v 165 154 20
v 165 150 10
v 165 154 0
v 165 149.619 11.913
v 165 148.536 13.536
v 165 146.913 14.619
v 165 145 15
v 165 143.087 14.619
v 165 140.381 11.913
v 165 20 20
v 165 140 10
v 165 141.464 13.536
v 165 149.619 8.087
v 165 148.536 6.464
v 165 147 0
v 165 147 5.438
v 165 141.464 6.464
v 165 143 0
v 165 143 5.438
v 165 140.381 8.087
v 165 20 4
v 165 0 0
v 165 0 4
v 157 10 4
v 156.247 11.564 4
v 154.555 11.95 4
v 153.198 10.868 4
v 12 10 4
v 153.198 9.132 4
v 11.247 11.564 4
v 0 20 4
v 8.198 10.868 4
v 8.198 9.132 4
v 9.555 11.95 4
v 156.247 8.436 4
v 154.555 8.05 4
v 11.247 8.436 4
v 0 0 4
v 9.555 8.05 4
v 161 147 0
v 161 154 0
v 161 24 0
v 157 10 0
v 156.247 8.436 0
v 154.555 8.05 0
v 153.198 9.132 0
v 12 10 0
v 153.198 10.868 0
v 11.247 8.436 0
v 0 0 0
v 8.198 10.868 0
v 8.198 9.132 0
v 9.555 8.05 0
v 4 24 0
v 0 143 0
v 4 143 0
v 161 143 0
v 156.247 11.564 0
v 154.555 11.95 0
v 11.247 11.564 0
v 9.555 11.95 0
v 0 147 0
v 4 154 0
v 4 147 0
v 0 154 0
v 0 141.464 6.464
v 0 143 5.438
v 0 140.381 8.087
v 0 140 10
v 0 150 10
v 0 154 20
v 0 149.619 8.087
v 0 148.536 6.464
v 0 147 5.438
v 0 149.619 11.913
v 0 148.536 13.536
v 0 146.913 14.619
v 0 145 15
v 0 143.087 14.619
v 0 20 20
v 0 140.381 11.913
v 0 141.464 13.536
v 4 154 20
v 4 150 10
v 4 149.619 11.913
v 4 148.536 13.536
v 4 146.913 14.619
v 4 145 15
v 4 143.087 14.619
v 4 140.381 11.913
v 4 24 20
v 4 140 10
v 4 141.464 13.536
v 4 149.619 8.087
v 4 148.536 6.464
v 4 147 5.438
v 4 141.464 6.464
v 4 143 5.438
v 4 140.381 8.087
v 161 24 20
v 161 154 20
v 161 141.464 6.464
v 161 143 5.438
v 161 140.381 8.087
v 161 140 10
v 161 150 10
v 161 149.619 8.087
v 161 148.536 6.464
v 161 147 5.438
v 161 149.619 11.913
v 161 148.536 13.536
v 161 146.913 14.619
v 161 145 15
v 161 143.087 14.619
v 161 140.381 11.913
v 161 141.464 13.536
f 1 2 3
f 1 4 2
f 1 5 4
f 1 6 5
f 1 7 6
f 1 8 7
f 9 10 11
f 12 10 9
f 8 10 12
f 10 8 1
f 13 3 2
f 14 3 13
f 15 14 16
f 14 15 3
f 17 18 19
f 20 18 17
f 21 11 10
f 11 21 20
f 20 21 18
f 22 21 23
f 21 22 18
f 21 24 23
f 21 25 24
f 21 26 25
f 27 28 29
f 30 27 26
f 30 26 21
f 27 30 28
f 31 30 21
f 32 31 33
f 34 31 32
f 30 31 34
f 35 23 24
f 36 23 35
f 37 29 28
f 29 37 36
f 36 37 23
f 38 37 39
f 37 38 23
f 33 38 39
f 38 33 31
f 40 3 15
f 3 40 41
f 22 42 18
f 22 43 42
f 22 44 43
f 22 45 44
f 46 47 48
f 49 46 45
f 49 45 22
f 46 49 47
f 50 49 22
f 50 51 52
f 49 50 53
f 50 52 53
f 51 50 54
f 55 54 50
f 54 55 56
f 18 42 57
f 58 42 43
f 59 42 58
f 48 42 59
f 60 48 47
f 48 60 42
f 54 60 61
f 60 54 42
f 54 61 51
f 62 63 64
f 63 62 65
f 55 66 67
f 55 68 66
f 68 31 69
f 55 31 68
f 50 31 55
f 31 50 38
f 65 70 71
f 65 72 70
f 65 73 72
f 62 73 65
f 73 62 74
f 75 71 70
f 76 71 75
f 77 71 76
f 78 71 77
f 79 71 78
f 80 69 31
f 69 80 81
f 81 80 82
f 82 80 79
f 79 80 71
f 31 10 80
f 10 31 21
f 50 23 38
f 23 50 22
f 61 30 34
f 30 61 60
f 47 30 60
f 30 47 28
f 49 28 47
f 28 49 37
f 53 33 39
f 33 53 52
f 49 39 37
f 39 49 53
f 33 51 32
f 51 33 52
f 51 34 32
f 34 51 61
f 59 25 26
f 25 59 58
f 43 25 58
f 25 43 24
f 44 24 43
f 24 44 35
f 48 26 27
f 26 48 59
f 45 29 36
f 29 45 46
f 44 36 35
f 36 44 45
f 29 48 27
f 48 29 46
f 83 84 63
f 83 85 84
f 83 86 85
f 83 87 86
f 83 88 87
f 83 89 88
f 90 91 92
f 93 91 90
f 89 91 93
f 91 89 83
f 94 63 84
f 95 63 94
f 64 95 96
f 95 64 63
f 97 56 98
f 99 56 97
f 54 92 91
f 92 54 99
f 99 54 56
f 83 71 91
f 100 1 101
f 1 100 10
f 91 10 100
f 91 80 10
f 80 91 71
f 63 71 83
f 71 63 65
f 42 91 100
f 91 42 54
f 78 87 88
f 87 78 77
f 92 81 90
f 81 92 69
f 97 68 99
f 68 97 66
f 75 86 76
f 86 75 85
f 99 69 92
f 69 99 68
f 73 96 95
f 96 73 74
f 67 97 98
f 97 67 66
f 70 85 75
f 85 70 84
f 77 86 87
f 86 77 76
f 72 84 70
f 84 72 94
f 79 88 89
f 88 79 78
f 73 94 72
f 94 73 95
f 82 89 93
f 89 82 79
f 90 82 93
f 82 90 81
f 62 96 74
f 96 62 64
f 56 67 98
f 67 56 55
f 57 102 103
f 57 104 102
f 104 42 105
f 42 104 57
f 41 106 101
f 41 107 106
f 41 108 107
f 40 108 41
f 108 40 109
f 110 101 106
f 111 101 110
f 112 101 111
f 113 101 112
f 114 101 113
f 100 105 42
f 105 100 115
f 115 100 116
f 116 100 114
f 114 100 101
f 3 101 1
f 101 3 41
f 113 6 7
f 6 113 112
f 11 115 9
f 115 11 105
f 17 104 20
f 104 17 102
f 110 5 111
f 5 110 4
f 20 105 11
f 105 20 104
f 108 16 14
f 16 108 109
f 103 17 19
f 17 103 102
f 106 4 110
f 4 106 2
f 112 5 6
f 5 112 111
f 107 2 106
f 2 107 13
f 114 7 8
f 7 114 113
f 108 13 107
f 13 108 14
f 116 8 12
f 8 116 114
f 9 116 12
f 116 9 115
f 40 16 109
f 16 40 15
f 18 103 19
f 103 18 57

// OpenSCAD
length = 165;
height = 20;
thickness = 4;
fixture_height = 20;
top_height = 130;

difference() {
    cube([length, fixture_height, thickness]);
    translate([10, 10, 0]) cylinder(thickness, r=2);
    translate([155, 10, 0]) cylinder(thickness, r=2);
}

translate([0, fixture_height, 0]) cube([165, thickness, height]);

// top
difference() {
    translate([0, fixture_height + thickness, 0]) cube([thickness, top_height, height]);
    translate([-thickness / 4, height + top_height - 5, height / 2]) rotate([0, 90, 0]) cylinder(2 * thickness, r=5);
    translate([-thickness / 4, height + top_height - 7, 0]) cube([2 * thickness, 4, 10]);
}
difference() {
    translate([length - thickness, fixture_height + thickness, 0]) cube([thickness, top_height, height]);
    translate([length - thickness - thickness / 4, height + top_height - 5, height / 2]) rotate([0, 90, 0]) cylinder(2 * thickness, r=5);
    translate([length - thickness - thickness / 4, height + top_height - 7, 0]) cube([2 * thickness, 4, 10]);
}
